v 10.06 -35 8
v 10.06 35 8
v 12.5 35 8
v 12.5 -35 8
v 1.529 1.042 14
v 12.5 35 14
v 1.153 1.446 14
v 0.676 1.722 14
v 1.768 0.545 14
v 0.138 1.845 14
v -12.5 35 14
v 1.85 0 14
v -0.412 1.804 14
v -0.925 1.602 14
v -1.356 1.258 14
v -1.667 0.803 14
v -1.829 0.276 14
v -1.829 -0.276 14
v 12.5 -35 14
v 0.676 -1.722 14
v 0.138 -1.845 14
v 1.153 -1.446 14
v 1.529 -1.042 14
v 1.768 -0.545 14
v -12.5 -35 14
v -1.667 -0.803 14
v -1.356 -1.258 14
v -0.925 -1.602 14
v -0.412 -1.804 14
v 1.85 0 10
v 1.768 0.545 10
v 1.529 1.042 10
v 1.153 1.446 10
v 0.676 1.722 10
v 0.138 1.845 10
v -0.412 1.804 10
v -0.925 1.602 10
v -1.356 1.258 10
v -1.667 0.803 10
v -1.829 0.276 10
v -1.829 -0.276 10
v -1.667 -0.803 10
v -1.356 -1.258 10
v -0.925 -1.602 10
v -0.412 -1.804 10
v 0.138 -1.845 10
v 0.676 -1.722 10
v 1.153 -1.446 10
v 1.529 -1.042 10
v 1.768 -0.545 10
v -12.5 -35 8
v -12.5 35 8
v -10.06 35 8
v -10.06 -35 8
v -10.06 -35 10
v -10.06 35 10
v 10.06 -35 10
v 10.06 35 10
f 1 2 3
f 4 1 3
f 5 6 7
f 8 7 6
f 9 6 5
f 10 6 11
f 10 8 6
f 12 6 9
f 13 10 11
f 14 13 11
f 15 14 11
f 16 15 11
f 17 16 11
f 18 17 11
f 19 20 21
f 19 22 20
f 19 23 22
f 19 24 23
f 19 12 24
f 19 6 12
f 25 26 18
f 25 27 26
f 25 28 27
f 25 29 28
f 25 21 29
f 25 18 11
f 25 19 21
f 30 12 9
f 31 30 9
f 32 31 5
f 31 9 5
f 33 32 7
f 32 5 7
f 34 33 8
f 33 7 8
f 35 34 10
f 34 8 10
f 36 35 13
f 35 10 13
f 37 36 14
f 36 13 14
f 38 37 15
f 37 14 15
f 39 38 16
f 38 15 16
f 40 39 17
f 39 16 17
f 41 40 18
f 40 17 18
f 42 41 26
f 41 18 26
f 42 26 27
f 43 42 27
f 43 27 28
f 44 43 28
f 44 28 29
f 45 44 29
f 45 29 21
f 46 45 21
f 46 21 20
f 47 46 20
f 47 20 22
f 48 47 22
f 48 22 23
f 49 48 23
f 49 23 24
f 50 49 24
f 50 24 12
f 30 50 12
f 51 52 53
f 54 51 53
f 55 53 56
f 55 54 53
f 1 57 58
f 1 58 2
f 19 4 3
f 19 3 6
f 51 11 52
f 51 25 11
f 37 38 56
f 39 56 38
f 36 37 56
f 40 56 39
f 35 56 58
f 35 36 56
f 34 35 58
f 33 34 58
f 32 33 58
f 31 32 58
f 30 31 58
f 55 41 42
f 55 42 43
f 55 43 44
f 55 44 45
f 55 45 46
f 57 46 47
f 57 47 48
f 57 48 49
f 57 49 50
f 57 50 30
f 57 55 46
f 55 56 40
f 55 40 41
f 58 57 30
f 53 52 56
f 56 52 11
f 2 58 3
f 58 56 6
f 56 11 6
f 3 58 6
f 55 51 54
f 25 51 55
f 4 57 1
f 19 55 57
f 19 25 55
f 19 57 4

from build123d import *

# Parameters (mm, degrees)
F1_DEPTH = 35
F2_R     = 1.85
F3_DEPTH = 6.001


# Not quite as in the source:
# - a feature names something its author has since deleted; it is built from what else it names


with BuildPart() as f1:
    # F0 (on Front) → F1 (new body, symmetric)
    with BuildSketch(Plane.XZ):
        Polygon((-10.06, 8), (-10.06, 10), (10.06, 10), (10.06, 8), (12.5, 8), (12.5, 14), (-12.5, 14), (-12.5, 8), align=None)
    extrude(amount=F1_DEPTH, both=True)

    # F2 (on face) → F3 (cut, through all)
    with BuildSketch(Plane.XY.offset(14)):
        Circle(F2_R)
    extrude(amount=-F3_DEPTH, mode=Mode.SUBTRACT)


solid = f1.part
